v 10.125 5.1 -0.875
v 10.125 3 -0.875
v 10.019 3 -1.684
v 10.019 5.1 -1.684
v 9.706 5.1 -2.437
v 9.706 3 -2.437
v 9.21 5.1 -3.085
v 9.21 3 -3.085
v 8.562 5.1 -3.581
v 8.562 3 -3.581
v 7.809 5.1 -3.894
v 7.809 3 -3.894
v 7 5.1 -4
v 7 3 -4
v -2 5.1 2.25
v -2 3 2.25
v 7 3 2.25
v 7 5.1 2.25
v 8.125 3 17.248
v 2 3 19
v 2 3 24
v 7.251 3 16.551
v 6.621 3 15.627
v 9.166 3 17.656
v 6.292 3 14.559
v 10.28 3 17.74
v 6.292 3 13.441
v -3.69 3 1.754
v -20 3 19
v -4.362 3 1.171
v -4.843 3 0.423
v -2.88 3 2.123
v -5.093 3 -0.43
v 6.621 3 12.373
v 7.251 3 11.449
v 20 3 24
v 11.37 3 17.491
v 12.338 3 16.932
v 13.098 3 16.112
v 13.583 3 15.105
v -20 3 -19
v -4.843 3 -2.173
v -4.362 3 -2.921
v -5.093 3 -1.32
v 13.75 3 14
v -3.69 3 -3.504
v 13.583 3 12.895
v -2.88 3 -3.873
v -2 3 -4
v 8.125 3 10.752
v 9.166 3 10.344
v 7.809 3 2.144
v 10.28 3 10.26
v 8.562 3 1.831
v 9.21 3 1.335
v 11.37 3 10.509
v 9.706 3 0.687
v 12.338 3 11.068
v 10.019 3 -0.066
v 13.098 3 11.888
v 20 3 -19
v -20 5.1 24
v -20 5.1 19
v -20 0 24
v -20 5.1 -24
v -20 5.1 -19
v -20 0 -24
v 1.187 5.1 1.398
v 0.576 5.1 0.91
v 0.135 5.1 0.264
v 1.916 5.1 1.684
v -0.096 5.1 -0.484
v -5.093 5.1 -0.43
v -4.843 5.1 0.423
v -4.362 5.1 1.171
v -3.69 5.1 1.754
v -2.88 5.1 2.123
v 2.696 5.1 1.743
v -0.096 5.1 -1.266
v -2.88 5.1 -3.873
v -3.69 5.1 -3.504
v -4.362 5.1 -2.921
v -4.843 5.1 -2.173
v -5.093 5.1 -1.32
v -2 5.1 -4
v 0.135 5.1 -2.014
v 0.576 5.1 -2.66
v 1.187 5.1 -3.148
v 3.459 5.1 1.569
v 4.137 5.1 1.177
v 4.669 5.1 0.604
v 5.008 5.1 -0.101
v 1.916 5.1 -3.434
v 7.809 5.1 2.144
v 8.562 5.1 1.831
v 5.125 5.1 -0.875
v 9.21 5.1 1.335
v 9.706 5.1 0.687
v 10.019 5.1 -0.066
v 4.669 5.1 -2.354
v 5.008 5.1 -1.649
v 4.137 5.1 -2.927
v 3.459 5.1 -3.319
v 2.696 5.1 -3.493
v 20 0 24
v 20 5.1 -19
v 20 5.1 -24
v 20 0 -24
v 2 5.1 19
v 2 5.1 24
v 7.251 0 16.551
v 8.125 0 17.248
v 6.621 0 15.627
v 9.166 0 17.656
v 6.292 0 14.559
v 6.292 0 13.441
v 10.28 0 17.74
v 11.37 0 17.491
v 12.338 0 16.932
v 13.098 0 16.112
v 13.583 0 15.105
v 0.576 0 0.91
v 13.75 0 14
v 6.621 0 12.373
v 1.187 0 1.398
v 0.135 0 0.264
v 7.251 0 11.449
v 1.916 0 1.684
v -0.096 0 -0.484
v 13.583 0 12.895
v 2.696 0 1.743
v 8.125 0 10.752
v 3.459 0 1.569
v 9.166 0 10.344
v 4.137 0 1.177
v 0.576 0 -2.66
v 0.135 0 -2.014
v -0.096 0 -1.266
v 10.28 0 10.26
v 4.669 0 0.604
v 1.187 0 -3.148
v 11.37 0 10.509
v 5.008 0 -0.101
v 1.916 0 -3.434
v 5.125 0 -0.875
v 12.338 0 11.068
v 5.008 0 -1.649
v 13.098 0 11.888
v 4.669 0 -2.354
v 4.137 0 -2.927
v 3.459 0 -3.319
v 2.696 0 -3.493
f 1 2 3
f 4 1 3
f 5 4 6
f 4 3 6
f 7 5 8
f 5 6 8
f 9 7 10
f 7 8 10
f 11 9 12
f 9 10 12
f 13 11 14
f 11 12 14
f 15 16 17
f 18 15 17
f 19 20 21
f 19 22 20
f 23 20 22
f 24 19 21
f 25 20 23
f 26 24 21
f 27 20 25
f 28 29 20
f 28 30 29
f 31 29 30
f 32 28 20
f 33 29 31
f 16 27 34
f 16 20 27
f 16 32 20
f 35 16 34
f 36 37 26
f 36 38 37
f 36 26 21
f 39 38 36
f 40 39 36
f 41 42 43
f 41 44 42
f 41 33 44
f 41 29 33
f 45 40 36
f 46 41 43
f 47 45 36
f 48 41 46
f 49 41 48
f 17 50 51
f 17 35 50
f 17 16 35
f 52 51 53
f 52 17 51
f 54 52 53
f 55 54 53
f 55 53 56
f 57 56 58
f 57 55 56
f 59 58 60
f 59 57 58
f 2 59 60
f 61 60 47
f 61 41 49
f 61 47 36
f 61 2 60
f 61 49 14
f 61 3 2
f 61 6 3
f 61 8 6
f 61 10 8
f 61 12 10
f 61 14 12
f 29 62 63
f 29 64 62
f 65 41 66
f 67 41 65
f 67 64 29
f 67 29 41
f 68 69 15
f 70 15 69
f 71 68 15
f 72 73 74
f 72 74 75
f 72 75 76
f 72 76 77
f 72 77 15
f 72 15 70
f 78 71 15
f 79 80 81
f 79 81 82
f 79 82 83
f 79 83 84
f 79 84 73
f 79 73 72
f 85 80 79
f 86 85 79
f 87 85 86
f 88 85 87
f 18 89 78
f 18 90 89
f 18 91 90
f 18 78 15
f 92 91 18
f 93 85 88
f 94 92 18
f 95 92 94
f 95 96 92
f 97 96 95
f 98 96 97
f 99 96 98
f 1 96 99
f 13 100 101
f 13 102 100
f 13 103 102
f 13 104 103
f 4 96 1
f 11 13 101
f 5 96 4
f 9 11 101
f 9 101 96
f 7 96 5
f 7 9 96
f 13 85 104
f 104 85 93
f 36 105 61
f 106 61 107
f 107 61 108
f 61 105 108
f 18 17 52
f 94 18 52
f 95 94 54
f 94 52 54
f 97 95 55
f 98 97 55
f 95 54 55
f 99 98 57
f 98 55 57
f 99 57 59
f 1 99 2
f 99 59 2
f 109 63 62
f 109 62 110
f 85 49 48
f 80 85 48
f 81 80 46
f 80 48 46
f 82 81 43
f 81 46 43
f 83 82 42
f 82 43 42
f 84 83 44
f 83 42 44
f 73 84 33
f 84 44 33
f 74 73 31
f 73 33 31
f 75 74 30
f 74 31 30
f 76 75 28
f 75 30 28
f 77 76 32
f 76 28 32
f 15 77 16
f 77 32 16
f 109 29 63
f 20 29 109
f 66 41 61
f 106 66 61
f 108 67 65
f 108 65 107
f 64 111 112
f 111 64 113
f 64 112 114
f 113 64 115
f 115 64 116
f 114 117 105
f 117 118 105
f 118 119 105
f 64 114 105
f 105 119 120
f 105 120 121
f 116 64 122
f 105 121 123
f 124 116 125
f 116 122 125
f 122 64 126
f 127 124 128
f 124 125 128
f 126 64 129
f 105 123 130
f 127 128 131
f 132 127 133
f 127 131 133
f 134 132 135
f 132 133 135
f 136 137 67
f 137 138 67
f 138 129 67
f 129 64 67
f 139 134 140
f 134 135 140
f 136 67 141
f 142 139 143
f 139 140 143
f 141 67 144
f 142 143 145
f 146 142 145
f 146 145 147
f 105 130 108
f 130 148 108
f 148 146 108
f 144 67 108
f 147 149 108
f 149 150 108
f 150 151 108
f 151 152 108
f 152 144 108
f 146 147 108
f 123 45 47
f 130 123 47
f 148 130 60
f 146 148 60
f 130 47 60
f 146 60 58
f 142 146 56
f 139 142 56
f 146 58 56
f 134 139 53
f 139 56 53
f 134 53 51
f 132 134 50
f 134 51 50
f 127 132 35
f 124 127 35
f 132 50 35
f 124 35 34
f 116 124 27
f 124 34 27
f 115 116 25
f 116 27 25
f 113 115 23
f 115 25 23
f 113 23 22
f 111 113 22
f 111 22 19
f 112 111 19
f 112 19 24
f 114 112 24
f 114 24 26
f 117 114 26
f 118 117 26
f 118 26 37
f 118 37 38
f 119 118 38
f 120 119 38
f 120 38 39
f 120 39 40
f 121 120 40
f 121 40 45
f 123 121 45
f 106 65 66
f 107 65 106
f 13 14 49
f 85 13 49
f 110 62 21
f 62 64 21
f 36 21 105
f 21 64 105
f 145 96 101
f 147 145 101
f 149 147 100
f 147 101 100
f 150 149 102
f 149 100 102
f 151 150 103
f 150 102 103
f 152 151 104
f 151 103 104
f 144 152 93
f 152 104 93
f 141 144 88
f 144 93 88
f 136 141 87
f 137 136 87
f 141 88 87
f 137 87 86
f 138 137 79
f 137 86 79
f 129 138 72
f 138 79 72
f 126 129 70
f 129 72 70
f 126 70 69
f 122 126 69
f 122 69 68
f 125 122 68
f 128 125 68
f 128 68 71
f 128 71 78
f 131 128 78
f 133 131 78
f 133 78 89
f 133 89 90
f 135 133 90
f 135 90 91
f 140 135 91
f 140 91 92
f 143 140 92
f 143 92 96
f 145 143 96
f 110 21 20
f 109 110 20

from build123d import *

# Parameters (mm, degrees)
SKETCH2_W               = 40
SKETCH2_H               = 48
BOSS_EXTRUDE3_DEPTH     = 3
SKETCH3_W               = 22
SKETCH3_H               = 5
SKETCH3_W_2             = 40
BOSS_EXTRUDE4_DEPTH     = 2.1
SKETCH4_R               = 2.625
CUT_EXTRUDE1_DEPTH      = 1
CUT_EXTRUDE1_DEPTH_BACK = 6.1
SKETCH5_R               = 3.75
CUT_EXTRUDE2_DEPTH      = 3.1
CUT_EXTRUDE2_DEPTH_BACK = 4


with BuildPart() as part:
    # Sketch2 → Boss-Extrude3 (new body)
    with BuildSketch(Plane(origin=(0, 0, 0), x_dir=(1, 0, 0), z_dir=(0, 1, 0))):
        Rectangle(SKETCH2_W, SKETCH2_H)
    extrude(amount=BOSS_EXTRUDE3_DEPTH)

    # Sketch3 → Boss-Extrude4 (add)
    with BuildSketch(Plane(origin=(0, 3, 0), x_dir=(1, 0, 0), z_dir=(0, 1, 0))):
        with Locations((-9, -21.5)):
            Rectangle(SKETCH3_W, SKETCH3_H)
        with BuildLine():
            ThreePointArc((1.125, 0.875), (0.209708691, 3.084708691), (-2, 4))
            Line((-2, 4), (-2, -2.25))
            ThreePointArc((-2, -2.25), (0.209708691, -1.334708691), (1.125, 0.875))
        make_face()
        with BuildLine():
            Line((-2, -2.25), (-2, 4))
            ThreePointArc((-2, 4), (-5.125, 0.875), (-2, -2.25))
        make_face()
        with BuildLine():
            ThreePointArc((10.125, 0.875), (9.209708691, 3.084708691), (7, 4))
            Line((7, 4), (7, -2.25))
            ThreePointArc((7, -2.25), (9.209708691, -1.334708691), (10.125, 0.875))
        make_face()
        with BuildLine():
            Line((7, -2.25), (7, 4))
            ThreePointArc((7, 4), (3.875, 0.875), (7, -2.25))
        make_face()
        with BuildLine():
            Line((7, 4), (-2, 4))
            ThreePointArc((-2, 4), (0.209708691, 3.084708691), (1.125, 0.875))
            ThreePointArc((1.125, 0.875), (0.209708691, -1.334708691), (-2, -2.25))
            Line((-2, -2.25), (7, -2.25))
            ThreePointArc((7, -2.25), (3.875, 0.875), (7, 4))
        make_face()
        with Locations((0, 21.5)):
            Rectangle(SKETCH3_W_2, SKETCH3_H)
    extrude(amount=BOSS_EXTRUDE4_DEPTH)

    # Sketch4 → Cut-Extrude1 (cut, two sides)
    with BuildSketch(Plane(origin=(0, 5.1, 0), x_dir=(1, 0, 0), z_dir=(0, 1, 0))) as cut_extrude1_sk:
        with Locations((2.5, 0.875)):
            Circle(SKETCH4_R)
    extrude(amount=CUT_EXTRUDE1_DEPTH, mode=Mode.SUBTRACT)
    extrude(cut_extrude1_sk.sketch, amount=-CUT_EXTRUDE1_DEPTH_BACK, mode=Mode.SUBTRACT)

    # Sketch5 → Cut-Extrude2 (cut, two sides)
    with BuildSketch(Plane(origin=(0, 3, 0), x_dir=(1, 0, 0), z_dir=(0, 1, 0))) as cut_extrude2_sk:
        with Locations((10, -14)):
            Circle(SKETCH5_R)
    extrude(amount=CUT_EXTRUDE2_DEPTH, mode=Mode.SUBTRACT)
    extrude(cut_extrude2_sk.sketch, amount=-CUT_EXTRUDE2_DEPTH_BACK, mode=Mode.SUBTRACT)


solid = part.part
